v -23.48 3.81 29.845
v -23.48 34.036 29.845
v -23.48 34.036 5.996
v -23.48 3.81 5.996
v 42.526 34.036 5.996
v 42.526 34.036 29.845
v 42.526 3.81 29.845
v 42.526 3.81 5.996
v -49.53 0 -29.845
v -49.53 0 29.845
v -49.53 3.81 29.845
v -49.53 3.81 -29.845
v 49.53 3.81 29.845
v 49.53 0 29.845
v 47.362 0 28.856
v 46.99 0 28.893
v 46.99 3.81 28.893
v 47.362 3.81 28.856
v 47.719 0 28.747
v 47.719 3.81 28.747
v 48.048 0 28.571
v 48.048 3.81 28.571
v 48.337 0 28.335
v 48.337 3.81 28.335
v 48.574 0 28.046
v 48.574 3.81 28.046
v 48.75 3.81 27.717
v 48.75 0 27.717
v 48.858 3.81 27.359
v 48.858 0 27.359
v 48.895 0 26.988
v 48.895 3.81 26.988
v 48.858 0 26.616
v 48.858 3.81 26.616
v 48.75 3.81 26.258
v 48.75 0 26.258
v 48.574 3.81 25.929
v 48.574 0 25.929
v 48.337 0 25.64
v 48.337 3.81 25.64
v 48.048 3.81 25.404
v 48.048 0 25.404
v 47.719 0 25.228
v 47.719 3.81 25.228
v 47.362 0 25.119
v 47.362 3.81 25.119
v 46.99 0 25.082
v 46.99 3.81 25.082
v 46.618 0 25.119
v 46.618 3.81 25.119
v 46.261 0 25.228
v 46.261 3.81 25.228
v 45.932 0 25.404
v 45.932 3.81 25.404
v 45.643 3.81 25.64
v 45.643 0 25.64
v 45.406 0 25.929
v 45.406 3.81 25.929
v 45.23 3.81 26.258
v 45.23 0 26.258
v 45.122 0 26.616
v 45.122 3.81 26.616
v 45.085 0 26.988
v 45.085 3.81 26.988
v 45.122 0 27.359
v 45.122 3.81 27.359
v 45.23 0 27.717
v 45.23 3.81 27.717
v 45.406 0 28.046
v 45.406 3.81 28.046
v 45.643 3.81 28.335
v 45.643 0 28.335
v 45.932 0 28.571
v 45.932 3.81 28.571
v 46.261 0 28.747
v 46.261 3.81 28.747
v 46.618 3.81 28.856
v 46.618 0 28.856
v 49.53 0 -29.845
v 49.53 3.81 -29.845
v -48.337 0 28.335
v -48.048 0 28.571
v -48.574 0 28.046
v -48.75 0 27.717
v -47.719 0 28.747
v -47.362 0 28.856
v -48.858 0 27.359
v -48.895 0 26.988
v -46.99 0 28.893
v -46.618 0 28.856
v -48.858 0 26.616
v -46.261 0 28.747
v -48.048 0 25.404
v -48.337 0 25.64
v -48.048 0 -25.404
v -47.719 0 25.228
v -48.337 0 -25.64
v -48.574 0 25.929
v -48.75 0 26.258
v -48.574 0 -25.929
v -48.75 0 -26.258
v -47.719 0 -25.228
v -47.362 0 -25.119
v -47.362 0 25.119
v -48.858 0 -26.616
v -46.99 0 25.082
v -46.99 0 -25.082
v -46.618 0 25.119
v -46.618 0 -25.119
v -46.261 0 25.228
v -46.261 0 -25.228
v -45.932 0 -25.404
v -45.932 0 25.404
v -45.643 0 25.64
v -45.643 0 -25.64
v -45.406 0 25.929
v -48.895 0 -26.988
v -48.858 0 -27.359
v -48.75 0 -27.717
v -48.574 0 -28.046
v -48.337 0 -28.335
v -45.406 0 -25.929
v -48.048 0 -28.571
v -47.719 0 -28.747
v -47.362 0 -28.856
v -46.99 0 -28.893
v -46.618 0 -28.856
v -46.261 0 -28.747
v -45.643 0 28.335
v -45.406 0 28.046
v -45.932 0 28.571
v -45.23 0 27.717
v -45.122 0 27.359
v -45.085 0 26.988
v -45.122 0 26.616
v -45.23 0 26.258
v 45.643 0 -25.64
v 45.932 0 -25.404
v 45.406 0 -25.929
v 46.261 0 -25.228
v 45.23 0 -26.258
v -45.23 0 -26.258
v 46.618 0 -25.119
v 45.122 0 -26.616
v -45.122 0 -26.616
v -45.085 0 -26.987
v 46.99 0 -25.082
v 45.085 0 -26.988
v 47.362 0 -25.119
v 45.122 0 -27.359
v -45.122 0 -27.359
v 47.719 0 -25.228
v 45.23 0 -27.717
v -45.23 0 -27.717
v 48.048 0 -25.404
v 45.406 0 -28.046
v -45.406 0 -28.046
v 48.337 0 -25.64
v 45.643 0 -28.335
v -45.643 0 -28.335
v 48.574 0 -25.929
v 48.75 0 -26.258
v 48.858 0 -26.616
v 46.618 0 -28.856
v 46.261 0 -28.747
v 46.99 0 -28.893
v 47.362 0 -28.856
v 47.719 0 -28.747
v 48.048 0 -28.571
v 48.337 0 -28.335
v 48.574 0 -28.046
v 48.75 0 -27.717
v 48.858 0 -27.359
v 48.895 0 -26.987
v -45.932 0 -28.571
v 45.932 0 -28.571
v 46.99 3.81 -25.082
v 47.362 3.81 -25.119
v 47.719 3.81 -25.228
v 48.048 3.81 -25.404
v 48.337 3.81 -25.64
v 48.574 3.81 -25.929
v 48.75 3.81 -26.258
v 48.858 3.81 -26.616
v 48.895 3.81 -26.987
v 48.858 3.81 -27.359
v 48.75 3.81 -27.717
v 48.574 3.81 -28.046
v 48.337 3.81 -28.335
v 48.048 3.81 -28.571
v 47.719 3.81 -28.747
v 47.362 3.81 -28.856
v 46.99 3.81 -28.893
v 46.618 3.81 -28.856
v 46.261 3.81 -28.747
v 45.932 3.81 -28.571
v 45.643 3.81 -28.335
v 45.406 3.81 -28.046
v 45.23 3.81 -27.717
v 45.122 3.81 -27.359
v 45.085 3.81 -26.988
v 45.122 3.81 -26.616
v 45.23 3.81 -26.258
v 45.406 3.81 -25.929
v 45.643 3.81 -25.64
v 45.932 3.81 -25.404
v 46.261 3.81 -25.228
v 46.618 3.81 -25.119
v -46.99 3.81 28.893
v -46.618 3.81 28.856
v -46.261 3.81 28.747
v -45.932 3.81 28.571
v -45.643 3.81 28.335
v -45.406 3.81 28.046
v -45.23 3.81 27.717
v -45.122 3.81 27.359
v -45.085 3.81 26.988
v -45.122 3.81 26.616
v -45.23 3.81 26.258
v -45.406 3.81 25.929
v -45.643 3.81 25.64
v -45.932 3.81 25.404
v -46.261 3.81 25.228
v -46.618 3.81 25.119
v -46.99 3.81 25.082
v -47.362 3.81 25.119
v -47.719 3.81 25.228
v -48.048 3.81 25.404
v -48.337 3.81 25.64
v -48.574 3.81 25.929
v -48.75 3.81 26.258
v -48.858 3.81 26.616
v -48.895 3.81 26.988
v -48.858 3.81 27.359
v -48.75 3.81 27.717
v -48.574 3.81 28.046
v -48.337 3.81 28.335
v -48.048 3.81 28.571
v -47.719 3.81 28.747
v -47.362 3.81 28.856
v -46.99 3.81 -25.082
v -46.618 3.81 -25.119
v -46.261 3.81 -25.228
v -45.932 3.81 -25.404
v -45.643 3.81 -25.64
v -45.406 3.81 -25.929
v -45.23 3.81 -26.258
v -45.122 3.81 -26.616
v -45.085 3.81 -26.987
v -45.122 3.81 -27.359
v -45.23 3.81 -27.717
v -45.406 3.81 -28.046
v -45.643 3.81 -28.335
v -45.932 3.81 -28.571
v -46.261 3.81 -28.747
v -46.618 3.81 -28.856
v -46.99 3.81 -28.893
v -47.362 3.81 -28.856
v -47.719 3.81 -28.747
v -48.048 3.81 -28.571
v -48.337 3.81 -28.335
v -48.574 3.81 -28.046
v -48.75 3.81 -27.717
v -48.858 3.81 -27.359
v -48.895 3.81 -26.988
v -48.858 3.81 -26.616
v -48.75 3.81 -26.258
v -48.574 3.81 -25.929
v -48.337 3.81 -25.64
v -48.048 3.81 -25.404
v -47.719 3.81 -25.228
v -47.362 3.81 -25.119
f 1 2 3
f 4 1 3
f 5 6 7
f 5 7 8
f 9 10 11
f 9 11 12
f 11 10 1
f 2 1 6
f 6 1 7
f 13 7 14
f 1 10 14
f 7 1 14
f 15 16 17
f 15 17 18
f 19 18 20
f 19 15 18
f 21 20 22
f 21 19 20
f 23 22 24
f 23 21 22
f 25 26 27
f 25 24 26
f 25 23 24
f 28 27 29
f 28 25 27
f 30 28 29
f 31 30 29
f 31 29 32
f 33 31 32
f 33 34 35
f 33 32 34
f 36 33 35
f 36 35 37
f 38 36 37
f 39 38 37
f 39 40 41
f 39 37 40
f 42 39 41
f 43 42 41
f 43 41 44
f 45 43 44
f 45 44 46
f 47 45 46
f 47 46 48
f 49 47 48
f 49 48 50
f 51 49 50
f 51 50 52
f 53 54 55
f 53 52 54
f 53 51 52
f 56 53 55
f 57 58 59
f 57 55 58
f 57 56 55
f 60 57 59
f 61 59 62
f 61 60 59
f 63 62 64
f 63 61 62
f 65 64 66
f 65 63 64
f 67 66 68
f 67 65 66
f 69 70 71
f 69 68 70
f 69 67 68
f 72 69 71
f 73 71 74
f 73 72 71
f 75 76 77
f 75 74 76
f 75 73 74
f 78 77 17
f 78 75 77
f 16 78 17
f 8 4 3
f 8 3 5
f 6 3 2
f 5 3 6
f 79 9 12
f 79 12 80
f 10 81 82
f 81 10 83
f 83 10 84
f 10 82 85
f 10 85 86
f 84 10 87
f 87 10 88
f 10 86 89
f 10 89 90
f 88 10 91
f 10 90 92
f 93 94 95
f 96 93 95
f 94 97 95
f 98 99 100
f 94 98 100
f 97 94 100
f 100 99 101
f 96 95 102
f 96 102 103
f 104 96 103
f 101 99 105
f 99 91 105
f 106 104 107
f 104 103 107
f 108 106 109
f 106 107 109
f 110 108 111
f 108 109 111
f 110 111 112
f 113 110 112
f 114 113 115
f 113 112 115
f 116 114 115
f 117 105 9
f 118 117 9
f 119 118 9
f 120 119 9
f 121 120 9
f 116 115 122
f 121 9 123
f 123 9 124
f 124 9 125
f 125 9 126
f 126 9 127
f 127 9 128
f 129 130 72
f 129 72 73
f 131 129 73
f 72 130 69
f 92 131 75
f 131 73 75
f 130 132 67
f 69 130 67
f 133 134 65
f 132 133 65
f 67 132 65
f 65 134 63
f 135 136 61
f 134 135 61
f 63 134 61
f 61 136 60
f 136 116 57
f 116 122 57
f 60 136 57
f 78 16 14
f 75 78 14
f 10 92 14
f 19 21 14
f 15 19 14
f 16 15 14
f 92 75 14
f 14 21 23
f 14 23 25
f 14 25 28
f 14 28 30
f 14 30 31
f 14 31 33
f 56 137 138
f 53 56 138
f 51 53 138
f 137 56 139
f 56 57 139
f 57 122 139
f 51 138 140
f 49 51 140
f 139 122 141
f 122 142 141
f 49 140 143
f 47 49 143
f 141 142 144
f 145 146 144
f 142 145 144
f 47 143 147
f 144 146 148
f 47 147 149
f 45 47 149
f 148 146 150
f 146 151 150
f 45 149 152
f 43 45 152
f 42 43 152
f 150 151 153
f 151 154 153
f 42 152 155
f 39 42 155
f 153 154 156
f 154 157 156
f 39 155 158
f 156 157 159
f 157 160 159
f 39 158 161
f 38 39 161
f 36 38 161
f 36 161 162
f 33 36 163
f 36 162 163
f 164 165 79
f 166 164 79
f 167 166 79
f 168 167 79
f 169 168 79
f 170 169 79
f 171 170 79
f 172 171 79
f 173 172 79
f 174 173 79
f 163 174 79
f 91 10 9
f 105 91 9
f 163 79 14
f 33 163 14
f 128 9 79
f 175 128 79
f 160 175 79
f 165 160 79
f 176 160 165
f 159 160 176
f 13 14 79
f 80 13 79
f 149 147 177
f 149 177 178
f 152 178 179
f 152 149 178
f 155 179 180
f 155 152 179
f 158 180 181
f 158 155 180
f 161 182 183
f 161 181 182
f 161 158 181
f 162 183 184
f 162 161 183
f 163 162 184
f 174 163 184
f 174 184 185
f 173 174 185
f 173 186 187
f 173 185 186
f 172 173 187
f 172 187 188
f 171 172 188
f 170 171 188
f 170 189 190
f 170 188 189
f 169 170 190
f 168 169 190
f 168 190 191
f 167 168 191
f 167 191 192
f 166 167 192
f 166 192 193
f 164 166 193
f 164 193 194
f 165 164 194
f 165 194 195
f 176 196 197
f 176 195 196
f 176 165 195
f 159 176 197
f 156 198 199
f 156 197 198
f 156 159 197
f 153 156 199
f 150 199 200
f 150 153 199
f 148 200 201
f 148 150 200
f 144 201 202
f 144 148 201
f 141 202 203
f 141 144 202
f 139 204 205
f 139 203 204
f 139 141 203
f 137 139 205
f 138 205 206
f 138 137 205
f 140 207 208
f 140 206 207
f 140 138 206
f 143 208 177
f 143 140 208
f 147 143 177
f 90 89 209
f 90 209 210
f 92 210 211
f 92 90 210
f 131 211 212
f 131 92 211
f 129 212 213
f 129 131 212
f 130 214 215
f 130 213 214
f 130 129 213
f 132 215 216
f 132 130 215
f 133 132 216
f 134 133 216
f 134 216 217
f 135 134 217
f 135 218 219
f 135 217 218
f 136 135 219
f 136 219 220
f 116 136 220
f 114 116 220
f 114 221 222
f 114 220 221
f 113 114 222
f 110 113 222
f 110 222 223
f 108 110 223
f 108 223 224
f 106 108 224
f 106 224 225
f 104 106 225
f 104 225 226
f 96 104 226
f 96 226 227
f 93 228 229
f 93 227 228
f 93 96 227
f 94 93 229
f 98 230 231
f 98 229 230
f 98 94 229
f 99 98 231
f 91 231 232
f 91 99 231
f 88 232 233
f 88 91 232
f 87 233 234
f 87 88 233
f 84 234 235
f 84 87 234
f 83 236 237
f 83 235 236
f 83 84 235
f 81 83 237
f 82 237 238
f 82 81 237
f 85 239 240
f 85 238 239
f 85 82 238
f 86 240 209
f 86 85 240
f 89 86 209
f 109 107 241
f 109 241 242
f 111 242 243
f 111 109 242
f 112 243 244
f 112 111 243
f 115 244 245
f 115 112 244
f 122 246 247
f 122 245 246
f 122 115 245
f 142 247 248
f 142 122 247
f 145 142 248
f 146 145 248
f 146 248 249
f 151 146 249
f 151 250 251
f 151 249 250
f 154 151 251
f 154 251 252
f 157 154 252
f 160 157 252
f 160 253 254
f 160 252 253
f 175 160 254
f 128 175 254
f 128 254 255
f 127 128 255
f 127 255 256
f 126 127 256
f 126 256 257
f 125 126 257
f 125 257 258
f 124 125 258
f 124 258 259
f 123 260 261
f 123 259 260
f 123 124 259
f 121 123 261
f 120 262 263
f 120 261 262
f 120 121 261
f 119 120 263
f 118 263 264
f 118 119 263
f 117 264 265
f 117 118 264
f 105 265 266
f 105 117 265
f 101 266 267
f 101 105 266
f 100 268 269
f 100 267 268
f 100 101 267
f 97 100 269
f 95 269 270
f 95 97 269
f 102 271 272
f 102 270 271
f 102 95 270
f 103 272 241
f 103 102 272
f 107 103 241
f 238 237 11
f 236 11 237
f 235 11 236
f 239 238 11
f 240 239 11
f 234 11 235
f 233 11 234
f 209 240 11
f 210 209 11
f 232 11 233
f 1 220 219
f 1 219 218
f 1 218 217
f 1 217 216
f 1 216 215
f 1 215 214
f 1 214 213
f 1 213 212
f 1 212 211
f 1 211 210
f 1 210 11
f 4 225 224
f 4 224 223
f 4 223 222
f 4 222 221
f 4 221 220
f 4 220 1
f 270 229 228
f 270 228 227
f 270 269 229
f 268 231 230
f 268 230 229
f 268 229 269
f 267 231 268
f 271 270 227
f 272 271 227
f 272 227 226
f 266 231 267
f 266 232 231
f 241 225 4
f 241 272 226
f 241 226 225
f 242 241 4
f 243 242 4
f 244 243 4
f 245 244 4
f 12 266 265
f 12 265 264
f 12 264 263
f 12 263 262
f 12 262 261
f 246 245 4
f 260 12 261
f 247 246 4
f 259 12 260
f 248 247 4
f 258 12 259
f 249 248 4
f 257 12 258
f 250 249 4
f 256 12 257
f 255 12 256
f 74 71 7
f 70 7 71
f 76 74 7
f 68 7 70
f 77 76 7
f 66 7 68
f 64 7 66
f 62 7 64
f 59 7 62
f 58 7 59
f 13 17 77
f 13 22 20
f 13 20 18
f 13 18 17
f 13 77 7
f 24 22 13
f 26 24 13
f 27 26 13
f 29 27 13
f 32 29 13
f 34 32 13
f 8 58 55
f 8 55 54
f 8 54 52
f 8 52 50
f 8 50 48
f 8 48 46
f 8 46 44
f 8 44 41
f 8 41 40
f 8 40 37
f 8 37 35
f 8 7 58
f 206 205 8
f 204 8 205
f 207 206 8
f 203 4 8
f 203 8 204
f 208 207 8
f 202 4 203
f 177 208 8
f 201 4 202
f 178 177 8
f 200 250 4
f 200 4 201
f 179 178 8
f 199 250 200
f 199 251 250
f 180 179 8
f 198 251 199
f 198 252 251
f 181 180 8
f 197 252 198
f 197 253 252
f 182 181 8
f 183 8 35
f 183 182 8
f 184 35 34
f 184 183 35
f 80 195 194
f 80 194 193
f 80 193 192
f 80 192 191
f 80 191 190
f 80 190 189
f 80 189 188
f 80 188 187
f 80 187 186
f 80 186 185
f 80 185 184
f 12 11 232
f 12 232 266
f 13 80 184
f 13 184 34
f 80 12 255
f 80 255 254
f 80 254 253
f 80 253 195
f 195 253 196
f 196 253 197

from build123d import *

# Parameters (mm, degrees)
SKETCH2_W               = 99.06
SKETCH2_H               = 59.69
BOSS_EXTRUDE1_DEPTH     = 3.81
CUT_EXTRUDE1_DEPTH      = 58.952230544
CUT_EXTRUDE1_DEPTH_BACK = 58.952230544
SKETCH3_R               = 1.905
SKETCH4_W               = 66.005411874
SKETCH4_H               = 23.84908854
BOSS_EXTRUDE2_DEPTH     = 30.226


with BuildPart() as part:
    # Sketch2 → Boss-Extrude1 (new body)
    with BuildSketch(Plane(origin=(0, 0, 0), x_dir=(1, 0, 0), z_dir=(0, 1, 0))):
        Rectangle(SKETCH2_W, SKETCH2_H)
    extrude(amount=BOSS_EXTRUDE1_DEPTH)

    # Sketch3 → Cut-Extrude1 (cut, two sides: drawn at the far end of the back side and taken through both)
    with BuildSketch(Plane(origin=(0, 3.81, 0), x_dir=(1, 0, 0), z_dir=(0, 1, 0)).offset(-CUT_EXTRUDE1_DEPTH_BACK)):
        with Locations(Location((-46.99, 26.9875, 0), (0, 0, 270))):
            Circle(SKETCH3_R)
        with Locations(Location((46.99, 26.9875, 0), (0, 0, 270))):
            Circle(SKETCH3_R)
        with Locations(Location((46.99, -26.9875, 0), (0, 0, 270))):
            Circle(SKETCH3_R)
        with Locations(Location((-46.99, -26.9875, 0), (0, 0, 270))):
            Circle(SKETCH3_R)
    extrude(amount=CUT_EXTRUDE1_DEPTH + CUT_EXTRUDE1_DEPTH_BACK, mode=Mode.SUBTRACT)

    # Sketch4 → Boss-Extrude2 (add)
    with BuildSketch(Plane(origin=(0, 3.81, 0), x_dir=(1, 0, 0), z_dir=(0, 1, 0))):
        with Locations((9.522918202, -17.92045573)):
            Rectangle(SKETCH4_W, SKETCH4_H)
    extrude(amount=BOSS_EXTRUDE2_DEPTH)


solid = part.part
